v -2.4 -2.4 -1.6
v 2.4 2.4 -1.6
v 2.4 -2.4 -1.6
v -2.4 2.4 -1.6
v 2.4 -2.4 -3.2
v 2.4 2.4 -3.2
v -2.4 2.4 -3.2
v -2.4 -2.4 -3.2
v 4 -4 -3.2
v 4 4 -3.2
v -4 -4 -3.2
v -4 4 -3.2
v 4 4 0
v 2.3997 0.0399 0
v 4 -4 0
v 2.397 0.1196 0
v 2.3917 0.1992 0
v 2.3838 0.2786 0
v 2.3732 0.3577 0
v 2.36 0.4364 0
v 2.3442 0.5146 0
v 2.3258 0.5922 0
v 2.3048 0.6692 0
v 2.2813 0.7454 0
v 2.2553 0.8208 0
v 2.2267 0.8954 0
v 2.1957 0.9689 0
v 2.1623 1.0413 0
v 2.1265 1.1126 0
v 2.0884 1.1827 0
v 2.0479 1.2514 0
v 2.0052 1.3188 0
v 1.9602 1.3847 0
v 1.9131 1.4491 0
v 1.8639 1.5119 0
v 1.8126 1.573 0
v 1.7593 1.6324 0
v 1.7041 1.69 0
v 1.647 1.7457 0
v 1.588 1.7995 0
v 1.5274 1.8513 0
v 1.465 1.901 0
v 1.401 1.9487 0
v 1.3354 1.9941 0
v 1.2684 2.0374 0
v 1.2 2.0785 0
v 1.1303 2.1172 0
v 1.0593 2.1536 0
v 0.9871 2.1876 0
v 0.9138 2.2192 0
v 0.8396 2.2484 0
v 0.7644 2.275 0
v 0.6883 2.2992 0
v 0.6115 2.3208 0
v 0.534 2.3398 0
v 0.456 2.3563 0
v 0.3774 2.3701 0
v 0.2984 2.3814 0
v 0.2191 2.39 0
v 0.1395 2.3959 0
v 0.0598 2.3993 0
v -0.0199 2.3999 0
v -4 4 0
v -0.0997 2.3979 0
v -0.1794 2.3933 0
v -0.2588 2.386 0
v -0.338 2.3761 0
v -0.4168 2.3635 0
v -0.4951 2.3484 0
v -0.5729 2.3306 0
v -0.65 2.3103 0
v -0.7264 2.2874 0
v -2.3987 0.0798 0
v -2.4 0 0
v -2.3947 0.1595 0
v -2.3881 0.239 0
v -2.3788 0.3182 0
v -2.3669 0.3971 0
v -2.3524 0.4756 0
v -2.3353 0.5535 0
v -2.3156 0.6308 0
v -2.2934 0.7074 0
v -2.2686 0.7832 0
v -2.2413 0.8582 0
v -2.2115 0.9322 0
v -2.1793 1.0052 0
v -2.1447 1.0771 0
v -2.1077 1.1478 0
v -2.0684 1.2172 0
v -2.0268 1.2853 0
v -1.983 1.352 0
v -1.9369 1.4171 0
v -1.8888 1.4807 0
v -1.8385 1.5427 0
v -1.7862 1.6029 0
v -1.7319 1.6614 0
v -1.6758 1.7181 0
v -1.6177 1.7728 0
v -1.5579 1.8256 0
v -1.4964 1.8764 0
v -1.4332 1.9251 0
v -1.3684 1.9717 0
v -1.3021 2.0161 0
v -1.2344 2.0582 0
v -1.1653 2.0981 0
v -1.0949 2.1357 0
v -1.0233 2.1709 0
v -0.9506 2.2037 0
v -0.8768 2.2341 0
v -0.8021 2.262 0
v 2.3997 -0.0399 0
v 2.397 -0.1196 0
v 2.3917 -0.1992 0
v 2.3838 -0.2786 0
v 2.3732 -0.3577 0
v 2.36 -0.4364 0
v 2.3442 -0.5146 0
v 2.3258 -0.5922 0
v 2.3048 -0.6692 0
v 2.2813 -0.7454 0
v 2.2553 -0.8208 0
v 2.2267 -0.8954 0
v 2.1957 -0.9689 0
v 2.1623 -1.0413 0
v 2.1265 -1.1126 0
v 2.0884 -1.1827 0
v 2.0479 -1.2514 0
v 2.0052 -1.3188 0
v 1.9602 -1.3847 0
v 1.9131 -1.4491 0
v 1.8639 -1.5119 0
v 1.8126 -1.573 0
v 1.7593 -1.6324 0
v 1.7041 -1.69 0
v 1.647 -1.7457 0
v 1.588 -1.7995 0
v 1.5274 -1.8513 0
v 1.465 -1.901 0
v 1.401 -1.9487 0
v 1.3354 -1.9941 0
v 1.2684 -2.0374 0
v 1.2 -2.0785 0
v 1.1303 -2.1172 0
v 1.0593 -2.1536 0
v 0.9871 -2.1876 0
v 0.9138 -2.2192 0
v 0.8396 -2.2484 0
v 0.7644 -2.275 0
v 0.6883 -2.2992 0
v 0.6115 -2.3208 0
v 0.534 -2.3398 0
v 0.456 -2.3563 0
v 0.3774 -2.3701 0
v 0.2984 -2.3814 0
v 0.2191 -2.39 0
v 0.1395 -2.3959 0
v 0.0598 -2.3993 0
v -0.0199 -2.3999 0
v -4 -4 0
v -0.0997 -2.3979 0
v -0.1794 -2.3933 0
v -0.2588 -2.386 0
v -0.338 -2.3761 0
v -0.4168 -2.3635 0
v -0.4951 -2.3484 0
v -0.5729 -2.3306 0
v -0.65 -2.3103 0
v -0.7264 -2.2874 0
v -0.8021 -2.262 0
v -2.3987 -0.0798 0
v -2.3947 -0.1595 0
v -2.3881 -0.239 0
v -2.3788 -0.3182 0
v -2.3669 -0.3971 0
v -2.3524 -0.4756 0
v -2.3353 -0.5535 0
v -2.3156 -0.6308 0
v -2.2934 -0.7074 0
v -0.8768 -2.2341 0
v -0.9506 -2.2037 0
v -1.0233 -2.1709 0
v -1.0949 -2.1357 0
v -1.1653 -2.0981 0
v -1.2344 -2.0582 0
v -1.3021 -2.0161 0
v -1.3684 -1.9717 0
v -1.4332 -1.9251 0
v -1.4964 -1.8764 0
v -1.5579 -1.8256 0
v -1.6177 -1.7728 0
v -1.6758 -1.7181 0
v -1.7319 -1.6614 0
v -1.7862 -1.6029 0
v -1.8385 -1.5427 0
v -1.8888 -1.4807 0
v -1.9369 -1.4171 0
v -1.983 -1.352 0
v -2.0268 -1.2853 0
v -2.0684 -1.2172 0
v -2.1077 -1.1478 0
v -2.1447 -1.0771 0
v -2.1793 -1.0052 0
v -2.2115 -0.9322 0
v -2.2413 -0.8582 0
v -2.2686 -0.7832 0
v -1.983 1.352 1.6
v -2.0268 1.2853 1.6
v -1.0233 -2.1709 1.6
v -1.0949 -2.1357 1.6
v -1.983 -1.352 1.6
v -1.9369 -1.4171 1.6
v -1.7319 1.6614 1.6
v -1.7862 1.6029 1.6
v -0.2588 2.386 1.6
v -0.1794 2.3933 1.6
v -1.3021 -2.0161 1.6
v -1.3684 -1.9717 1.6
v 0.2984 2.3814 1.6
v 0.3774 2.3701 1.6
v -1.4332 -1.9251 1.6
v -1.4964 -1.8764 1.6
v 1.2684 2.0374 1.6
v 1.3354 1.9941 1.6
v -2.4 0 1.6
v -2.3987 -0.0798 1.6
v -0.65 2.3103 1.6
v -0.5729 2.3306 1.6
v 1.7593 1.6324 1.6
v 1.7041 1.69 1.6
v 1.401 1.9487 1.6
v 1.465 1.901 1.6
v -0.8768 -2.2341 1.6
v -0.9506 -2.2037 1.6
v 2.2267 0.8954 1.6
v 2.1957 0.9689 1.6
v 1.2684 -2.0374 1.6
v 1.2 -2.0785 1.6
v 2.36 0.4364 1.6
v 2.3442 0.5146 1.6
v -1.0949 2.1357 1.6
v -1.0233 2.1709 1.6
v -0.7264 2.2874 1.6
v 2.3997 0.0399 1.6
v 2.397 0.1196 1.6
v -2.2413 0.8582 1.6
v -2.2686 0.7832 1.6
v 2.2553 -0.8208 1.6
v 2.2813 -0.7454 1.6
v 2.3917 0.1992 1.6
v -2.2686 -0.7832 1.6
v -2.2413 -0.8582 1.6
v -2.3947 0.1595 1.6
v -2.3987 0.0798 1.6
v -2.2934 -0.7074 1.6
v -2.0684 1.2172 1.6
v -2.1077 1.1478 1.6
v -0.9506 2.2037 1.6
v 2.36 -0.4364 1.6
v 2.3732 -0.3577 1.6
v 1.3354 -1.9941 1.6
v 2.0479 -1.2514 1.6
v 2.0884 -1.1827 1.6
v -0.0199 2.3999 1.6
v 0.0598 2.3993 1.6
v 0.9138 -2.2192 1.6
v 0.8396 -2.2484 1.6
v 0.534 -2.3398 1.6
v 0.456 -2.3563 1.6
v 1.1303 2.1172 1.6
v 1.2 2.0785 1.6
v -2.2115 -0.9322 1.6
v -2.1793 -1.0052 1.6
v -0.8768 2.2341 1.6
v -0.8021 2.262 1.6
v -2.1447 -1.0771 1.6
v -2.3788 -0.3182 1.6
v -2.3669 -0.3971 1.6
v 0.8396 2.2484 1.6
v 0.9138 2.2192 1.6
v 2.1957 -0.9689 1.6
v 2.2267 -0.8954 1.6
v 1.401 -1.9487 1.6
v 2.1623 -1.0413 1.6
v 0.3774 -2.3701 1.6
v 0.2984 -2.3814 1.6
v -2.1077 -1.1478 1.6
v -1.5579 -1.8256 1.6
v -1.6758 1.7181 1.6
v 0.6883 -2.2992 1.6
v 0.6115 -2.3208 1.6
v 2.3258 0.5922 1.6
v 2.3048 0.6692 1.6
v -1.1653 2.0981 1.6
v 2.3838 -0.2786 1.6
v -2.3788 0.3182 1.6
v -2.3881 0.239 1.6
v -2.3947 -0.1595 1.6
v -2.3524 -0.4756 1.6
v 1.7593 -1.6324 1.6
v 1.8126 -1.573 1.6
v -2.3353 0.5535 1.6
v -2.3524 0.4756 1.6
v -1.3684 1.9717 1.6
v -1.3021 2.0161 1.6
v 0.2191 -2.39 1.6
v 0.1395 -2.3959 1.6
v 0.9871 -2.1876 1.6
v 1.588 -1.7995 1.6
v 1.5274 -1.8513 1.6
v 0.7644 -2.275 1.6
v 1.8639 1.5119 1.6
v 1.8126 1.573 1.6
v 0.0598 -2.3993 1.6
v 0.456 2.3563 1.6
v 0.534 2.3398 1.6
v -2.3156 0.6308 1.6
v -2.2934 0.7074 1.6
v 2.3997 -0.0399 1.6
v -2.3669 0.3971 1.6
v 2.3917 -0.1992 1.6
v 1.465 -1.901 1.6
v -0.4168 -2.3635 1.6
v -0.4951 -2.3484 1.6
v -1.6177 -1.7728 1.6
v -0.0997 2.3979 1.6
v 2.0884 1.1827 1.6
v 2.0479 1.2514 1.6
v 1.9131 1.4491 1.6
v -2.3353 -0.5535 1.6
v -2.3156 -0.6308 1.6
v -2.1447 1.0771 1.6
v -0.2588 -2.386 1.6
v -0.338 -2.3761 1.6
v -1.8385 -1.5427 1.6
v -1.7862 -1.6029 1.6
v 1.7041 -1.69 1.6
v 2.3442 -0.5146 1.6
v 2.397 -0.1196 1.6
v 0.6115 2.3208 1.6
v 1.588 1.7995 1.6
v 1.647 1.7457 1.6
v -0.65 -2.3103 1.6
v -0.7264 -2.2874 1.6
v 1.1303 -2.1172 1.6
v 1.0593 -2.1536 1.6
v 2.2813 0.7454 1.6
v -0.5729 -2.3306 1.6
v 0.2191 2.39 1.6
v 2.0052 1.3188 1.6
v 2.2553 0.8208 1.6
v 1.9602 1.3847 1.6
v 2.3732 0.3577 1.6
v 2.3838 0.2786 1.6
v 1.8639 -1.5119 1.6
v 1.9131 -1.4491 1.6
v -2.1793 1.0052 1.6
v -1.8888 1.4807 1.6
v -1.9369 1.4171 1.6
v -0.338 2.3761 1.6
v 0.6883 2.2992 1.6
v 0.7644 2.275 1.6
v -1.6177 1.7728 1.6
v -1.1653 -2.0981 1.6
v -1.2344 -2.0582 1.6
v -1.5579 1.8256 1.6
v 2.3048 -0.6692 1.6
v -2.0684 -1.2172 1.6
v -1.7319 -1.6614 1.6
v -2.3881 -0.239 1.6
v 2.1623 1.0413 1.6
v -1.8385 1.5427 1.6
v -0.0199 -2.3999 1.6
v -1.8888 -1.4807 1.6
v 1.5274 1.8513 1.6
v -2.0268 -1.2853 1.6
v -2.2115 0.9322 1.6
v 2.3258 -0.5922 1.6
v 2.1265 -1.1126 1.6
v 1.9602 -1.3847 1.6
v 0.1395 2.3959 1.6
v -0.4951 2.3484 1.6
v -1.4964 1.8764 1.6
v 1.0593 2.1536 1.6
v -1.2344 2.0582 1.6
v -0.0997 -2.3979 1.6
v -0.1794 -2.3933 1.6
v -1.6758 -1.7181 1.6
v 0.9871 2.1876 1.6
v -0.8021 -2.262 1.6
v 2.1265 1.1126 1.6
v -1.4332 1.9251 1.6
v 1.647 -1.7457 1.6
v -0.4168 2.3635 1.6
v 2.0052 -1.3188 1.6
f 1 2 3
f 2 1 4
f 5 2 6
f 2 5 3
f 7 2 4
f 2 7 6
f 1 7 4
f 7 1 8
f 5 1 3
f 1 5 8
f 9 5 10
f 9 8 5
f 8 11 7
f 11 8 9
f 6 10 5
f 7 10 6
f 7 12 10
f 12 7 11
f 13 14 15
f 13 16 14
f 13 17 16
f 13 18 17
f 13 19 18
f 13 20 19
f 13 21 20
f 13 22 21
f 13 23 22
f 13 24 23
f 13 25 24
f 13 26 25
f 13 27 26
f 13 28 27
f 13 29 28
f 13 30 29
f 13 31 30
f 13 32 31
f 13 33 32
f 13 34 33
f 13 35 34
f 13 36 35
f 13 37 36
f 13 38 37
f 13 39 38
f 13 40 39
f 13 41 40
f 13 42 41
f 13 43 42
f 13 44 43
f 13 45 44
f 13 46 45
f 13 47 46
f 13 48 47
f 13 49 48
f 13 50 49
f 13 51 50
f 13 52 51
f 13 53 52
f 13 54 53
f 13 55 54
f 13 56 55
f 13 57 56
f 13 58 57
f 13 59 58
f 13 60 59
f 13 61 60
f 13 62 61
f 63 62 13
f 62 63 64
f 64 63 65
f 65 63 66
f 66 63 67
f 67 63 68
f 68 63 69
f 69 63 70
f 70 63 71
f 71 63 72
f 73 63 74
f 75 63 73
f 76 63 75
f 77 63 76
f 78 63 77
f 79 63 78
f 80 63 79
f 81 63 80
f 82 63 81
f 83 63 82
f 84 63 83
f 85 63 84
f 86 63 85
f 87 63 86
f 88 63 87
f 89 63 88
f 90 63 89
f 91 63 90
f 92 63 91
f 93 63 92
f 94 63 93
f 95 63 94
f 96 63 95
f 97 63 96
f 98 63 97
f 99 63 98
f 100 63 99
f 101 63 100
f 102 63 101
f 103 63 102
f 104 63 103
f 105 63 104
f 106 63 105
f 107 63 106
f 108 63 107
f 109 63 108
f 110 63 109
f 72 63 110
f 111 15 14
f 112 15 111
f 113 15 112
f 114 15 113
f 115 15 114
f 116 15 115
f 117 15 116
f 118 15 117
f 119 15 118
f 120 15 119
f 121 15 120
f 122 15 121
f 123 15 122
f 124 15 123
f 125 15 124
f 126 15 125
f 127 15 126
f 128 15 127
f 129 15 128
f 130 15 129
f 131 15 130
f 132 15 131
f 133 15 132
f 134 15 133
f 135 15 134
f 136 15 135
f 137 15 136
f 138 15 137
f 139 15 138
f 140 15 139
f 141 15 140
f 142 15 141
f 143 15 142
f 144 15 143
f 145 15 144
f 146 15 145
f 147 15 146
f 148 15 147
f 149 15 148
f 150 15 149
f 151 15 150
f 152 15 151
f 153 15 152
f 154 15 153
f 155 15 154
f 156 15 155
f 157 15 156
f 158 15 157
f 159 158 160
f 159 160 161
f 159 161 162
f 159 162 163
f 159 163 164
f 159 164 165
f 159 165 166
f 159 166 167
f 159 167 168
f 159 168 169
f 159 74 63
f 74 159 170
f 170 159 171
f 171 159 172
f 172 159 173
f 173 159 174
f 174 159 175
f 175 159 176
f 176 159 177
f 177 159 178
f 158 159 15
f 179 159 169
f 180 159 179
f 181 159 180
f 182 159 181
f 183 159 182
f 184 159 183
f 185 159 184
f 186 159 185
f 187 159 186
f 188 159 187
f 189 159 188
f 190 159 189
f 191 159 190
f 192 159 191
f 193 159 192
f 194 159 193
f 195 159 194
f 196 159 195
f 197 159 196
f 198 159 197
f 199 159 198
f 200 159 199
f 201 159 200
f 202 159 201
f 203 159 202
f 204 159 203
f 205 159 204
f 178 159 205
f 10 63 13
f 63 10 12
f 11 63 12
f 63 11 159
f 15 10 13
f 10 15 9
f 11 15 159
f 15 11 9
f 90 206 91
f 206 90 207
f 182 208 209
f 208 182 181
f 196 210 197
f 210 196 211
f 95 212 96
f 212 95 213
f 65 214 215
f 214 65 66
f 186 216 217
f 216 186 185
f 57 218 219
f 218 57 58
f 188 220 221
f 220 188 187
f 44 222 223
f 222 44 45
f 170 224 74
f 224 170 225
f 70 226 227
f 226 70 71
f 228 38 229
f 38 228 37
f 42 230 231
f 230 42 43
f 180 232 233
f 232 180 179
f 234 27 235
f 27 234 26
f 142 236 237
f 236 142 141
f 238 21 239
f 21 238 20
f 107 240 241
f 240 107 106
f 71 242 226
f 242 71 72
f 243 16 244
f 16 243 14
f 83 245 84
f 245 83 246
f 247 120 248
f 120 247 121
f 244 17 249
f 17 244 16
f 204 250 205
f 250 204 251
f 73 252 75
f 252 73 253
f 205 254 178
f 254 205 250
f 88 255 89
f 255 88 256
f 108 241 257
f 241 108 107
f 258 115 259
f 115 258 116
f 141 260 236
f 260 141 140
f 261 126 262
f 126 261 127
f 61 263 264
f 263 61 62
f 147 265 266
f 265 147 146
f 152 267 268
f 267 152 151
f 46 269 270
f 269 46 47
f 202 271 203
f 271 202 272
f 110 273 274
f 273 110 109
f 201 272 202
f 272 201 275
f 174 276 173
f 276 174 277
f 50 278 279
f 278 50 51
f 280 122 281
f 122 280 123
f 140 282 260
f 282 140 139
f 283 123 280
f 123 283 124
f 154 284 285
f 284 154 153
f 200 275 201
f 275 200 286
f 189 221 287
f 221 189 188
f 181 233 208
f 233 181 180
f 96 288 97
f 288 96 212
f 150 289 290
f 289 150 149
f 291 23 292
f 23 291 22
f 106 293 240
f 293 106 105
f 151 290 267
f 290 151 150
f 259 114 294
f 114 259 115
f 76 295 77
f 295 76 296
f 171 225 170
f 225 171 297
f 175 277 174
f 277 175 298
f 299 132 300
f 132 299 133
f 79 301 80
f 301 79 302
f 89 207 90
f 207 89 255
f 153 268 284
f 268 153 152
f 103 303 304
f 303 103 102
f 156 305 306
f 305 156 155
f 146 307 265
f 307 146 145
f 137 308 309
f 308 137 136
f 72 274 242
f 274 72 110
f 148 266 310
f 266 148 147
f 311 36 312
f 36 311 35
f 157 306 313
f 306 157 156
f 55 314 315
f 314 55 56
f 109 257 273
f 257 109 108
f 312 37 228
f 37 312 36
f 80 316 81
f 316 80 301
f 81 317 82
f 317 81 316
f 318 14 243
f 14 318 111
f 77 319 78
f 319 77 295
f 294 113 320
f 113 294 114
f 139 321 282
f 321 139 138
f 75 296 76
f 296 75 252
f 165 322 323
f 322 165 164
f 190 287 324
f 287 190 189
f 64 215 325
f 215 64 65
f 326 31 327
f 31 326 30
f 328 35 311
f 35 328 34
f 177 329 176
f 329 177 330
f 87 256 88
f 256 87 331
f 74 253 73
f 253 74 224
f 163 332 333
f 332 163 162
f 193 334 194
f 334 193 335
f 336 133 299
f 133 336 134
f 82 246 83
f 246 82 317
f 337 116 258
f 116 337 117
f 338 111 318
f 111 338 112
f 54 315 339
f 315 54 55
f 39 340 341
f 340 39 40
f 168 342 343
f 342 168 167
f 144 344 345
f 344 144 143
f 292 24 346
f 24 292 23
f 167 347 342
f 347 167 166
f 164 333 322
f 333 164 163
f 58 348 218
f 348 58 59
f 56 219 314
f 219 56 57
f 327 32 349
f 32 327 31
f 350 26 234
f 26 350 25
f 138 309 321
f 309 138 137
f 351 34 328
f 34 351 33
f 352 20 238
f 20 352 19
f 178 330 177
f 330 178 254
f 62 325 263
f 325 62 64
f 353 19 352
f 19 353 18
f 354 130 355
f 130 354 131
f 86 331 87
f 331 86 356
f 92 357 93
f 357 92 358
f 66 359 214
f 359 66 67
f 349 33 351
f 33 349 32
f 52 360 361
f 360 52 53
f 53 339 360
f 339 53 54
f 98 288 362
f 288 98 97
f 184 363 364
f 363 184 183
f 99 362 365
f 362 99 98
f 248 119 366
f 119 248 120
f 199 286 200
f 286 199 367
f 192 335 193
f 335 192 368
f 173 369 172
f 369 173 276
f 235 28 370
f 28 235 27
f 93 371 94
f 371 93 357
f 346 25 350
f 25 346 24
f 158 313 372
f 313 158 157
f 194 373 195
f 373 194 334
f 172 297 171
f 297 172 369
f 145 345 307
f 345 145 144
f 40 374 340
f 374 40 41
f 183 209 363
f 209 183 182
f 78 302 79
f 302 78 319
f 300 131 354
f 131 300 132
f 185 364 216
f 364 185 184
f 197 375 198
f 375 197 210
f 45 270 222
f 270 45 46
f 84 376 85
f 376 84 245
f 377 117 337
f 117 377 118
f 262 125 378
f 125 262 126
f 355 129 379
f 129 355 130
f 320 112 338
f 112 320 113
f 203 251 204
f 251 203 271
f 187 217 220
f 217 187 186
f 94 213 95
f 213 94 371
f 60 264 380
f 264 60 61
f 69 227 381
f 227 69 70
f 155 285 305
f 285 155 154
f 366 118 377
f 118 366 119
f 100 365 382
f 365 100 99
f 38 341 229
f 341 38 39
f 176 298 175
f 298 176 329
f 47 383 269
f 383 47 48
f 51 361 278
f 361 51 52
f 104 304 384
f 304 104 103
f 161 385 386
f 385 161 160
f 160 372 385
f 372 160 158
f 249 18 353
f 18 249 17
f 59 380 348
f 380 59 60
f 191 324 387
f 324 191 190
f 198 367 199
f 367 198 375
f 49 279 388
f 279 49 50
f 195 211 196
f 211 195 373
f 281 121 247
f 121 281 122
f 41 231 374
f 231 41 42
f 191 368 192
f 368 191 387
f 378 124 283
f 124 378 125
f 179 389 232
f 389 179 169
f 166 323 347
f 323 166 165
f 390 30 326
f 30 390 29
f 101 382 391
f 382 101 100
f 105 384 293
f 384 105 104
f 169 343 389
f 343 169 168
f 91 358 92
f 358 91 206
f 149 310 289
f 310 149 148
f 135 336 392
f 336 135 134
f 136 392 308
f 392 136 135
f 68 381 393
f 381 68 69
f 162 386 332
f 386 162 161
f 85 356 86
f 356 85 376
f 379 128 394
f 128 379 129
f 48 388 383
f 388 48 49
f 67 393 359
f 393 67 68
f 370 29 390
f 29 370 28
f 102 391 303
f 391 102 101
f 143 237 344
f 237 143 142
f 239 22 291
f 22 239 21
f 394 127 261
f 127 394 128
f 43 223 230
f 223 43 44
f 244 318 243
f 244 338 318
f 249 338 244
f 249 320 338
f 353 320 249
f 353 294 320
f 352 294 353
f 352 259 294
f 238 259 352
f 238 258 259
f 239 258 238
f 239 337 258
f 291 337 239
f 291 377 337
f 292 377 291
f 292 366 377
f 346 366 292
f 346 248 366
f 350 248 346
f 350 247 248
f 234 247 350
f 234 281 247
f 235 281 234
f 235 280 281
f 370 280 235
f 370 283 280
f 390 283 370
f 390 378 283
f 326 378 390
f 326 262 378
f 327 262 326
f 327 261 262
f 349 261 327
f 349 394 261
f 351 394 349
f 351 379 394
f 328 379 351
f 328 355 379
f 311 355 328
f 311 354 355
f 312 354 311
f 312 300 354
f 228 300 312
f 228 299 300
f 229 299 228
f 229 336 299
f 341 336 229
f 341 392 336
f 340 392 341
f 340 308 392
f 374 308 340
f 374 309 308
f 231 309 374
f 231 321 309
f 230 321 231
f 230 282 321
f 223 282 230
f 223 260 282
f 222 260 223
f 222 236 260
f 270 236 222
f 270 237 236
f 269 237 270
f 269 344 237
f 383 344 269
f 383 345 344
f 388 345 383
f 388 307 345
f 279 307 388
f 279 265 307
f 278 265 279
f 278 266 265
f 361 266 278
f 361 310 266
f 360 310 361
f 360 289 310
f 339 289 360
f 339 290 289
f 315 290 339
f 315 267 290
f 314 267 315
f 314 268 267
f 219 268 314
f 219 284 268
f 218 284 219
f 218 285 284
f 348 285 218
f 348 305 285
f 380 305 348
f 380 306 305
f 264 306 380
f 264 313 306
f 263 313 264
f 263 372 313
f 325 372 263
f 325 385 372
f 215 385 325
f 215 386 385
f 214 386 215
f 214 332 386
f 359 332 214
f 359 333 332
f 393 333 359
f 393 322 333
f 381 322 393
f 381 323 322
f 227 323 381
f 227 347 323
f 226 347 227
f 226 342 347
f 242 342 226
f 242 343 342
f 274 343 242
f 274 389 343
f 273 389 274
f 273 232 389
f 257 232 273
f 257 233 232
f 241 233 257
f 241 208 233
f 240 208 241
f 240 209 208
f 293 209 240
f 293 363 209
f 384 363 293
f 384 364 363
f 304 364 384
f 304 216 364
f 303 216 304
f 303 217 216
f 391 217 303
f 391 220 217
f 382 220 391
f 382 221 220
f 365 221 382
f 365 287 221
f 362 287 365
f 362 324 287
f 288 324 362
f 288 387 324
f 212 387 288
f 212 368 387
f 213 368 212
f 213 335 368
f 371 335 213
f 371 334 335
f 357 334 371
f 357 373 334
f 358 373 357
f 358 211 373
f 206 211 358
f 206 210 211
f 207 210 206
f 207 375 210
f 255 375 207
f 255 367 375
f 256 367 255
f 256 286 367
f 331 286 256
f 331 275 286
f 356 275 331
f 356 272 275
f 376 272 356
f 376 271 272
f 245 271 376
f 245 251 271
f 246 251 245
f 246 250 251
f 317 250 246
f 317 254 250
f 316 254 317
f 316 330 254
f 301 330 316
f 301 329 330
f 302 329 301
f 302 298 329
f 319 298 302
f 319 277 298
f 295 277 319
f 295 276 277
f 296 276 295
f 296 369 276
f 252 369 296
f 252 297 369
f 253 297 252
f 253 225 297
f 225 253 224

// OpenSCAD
// file: ../p/stud3.scad
use <../lib.scad>
use <4-4cyli.scad>
use <4-4disc.scad>
use <4-4edge.scad>
$fa=1; $fs=0.2;
function ldraw_lib__stud3(realsolid=false) = realsolid ? 
    [openscad(translate([0,0,-eps()], o=cylinder(4+eps(), r=4)),2)] : [
// 0 Stud Tube Solid
// 0 Name: stud3.dat
// 0 Author: James Jessiman
// 0 !LDRAW_ORG Primitive UPDATE 2012-01
// 0 !LICENSE Licensed under CC BY 2.0 and CC BY 4.0 : see CAreadme.txt
// 
// 0 BFC CERTIFY CCW
  [0,"BFC","CERTIFY"],
  [0,"BFC","CCW"],
// 
// 0 !HISTORY 2002-04-04 [sbliss] Modified for BFC compliance
// 0 !HISTORY 2002-04-25 [PTadmin] Official Update 2002-02
// 0 !HISTORY 2007-06-24 [PTadmin] Header formatted for Contributor Agreement
// 0 !HISTORY 2008-07-01 [PTadmin] Official Update 2008-01
// 0 !HISTORY 2012-02-16 [Philo] Changed to CCW
// 0 !HISTORY 2012-03-30 [PTadmin] Official Update 2012-01
// 
// 
// 1 16 0 -4 0 4 0 0 0 1 0 0 0 4 4-4edge.dat
  [1,16,0,-4,0,4,0,0,0,1,0,0,0,4, ldraw_lib__4_4edge(realsolid)],
// 1 16 0 0 0 4 0 0 0 1 0 0 0 4 4-4edge.dat
  [1,16,0,0,0,4,0,0,0,1,0,0,0,4, ldraw_lib__4_4edge(realsolid)],
// 1 16 0 -4 0 4 0 0 0 1 0 0 0 4 4-4disc.dat
  [1,16,0,-4,0,4,0,0,0,1,0,0,0,4, ldraw_lib__4_4disc(realsolid)],
// 1 16 0 -4 0 4 0 0 0 4 0 0 0 4 4-4cyli.dat
  [1,16,0,-4,0,4,0,0,0,4,0,0,0,4, ldraw_lib__4_4cyli(realsolid)],
];
module ldraw_lib__stud3(step=0, col=false, unit=2/5, alt=false, line=0.2, solid=!$preview)
    makepoly(ldraw_lib__stud3(solid), step=step, col=col, unit=unit, alt=alt, line=line, solid=solid);
ldraw_lib__stud3(line=0.2);
// file: ../p/4-4edge.scad
use <../lib.scad>
$fa=1; $fs=0.2;
function ldraw_lib__4_4edge(realsolid=false) = [
// 0 Circle 1.0
// 0 Name: 4-4edge.dat
// 0 Author: James Jessiman
// 0 !LDRAW_ORG Primitive UPDATE 2017-01
// 0 !LICENSE Licensed under CC BY 2.0 and CC BY 4.0 : see CAreadme.txt
// 
// 0 BFC CERTIFY CCW
  [0,"BFC","CERTIFY"],
  [0,"BFC","CCW"],
// 
// 0 !HISTORY 1998-12-15 [PTadmin] Official Update 1998-10
// 0 !HISTORY 2005-12-28 [PTadmin] Official Update 2005-01
// 0 !HISTORY 2007-06-24 [PTadmin] Header formatted for Contributor Agreement
// 0 !HISTORY 2008-07-01 [PTadmin] Official Update 2008-01
// 0 !HISTORY 2017-01-15 [Steffen] BFCed
// 0 !HISTORY 2017-12-30 [PTadmin] Official Update 2017-01
// 
// 
// 2 24 1 0 0 0.9239 0 0.3827
  [2,24,1,0,0,0.9239,0,0.3827],
// 2 24 0.9239 0 0.3827 0.7071 0 0.7071
  [2,24,0.9239,0,0.3827,0.7071,0,0.7071],
// 2 24 0.7071 0 0.7071 0.3827 0 0.9239
  [2,24,0.7071,0,0.7071,0.3827,0,0.9239],
// 2 24 0.3827 0 0.9239 0 0 1
  [2,24,0.3827,0,0.9239,0,0,1],
// 2 24 0 0 1 -0.3827 0 0.9239
  [2,24,0,0,1,-0.3827,0,0.9239],
// 2 24 -0.3827 0 0.9239 -0.7071 0 0.7071
  [2,24,-0.3827,0,0.9239,-0.7071,0,0.7071],
// 2 24 -0.7071 0 0.7071 -0.9239 0 0.3827
  [2,24,-0.7071,0,0.7071,-0.9239,0,0.3827],
// 2 24 -0.9239 0 0.3827 -1 0 -0
  [2,24,-0.9239,0,0.3827,-1,0,-0],
// 2 24 -1 0 -0 -0.9239 0 -0.3827
  [2,24,-1,0,-0,-0.9239,0,-0.3827],
// 2 24 -0.9239 0 -0.3827 -0.7071 0 -0.7071
  [2,24,-0.9239,0,-0.3827,-0.7071,0,-0.7071],
// 2 24 -0.7071 0 -0.7071 -0.3827 0 -0.9239
  [2,24,-0.7071,0,-0.7071,-0.3827,0,-0.9239],
// 2 24 -0.3827 0 -0.9239 0 0 -1
  [2,24,-0.3827,0,-0.9239,0,0,-1],
// 2 24 0 0 -1 0.3827 0 -0.9239
  [2,24,0,0,-1,0.3827,0,-0.9239],
// 2 24 0.3827 0 -0.9239 0.7071 0 -0.7071
  [2,24,0.3827,0,-0.9239,0.7071,0,-0.7071],
// 2 24 0.7071 0 -0.7071 0.9239 0 -0.3827
  [2,24,0.7071,0,-0.7071,0.9239,0,-0.3827],
// 2 24 0.9239 0 -0.3827 1 0 0
  [2,24,0.9239,0,-0.3827,1,0,0],
];
module ldraw_lib__4_4edge(step=0, col=false, unit=2/5, alt=false, line=0.2, solid=!$preview)
    makepoly(ldraw_lib__4_4edge(solid), step=step, col=col, unit=unit, alt=alt, line=line, solid=solid);
ldraw_lib__4_4edge(line=0.2);
// file: ../p/4-4disc.scad
use <../lib.scad>
$fa=1; $fs=0.2;
function ldraw_lib__4_4disc(realsolid=false) = [
// 0 Disc 1.0
// 0 Name: 4-4disc.dat
// 0 Author: James Jessiman
// 0 !LDRAW_ORG Primitive UPDATE 2002-02
// 0 !LICENSE Licensed under CC BY 2.0 and CC BY 4.0 : see CAreadme.txt
// 
// 0 BFC CERTIFY CCW
  [0,"BFC","CERTIFY"],
  [0,"BFC","CCW"],
// 
// 0 !HISTORY 1998-12-15 [PTadmin] Official Update 1998-10
// 0 !HISTORY 2002-03-23 [sbliss] Added BFC statement
// 0 !HISTORY 2002-04-25 [PTadmin] Official Update 2002-02
// 0 !HISTORY 2007-06-24 [PTadmin] Header formatted for Contributor Agreement
// 0 !HISTORY 2008-07-01 [PTadmin] Official Update 2008-01
// 
// 
// 3 16 0 0 0 1 0 0 0.9239 0 0.3827
  [3,16,0,0,0,1,0,0,0.9239,0,0.3827],
// 3 16 0 0 0 0.9239 0 0.3827 0.7071 0 0.7071
  [3,16,0,0,0,0.9239,0,0.3827,0.7071,0,0.7071],
// 3 16 0 0 0 0.7071 0 0.7071 0.3827 0 0.9239
  [3,16,0,0,0,0.7071,0,0.7071,0.3827,0,0.9239],
// 3 16 0 0 0 0.3827 0 0.9239 0 0 1
  [3,16,0,0,0,0.3827,0,0.9239,0,0,1],
// 3 16 0 0 0 0 0 1 -0.3827 0 0.9239
  [3,16,0,0,0,0,0,1,-0.3827,0,0.9239],
// 3 16 0 0 0 -0.3827 0 0.9239 -0.7071 0 0.7071
  [3,16,0,0,0,-0.3827,0,0.9239,-0.7071,0,0.7071],
// 3 16 0 0 0 -0.7071 0 0.7071 -0.9239 0 0.3827
  [3,16,0,0,0,-0.7071,0,0.7071,-0.9239,0,0.3827],
// 3 16 0 0 0 -0.9239 0 0.3827 -1 0 -0
  [3,16,0,0,0,-0.9239,0,0.3827,-1,0,-0],
// 3 16 0 0 0 -1 0 -0 -0.9239 0 -0.3827
  [3,16,0,0,0,-1,0,-0,-0.9239,0,-0.3827],
// 3 16 0 0 0 -0.9239 0 -0.3827 -0.7071 0 -0.7071
  [3,16,0,0,0,-0.9239,0,-0.3827,-0.7071,0,-0.7071],
// 3 16 0 0 0 -0.7071 0 -0.7071 -0.3827 0 -0.9239
  [3,16,0,0,0,-0.7071,0,-0.7071,-0.3827,0,-0.9239],
// 3 16 0 0 0 -0.3827 0 -0.9239 0 0 -1
  [3,16,0,0,0,-0.3827,0,-0.9239,0,0,-1],
// 3 16 0 0 0 0 0 -1 0.3827 0 -0.9239
  [3,16,0,0,0,0,0,-1,0.3827,0,-0.9239],
// 3 16 0 0 0 0.3827 0 -0.9239 0.7071 0 -0.7071
  [3,16,0,0,0,0.3827,0,-0.9239,0.7071,0,-0.7071],
// 3 16 0 0 0 0.7071 0 -0.7071 0.9239 0 -0.3827
  [3,16,0,0,0,0.7071,0,-0.7071,0.9239,0,-0.3827],
// 3 16 0 0 0 0.9239 0 -0.3827 1 0 0
  [3,16,0,0,0,0.9239,0,-0.3827,1,0,0],
// 0
];
module ldraw_lib__4_4disc(step=0, col=false, unit=2/5, alt=false, line=0.2, solid=!$preview)
    makepoly(ldraw_lib__4_4disc(solid), step=step, col=col, unit=unit, alt=alt, line=line, solid=solid);
ldraw_lib__4_4disc(line=0.2);
// file: ../p/4-4cyli.scad
use <../lib.scad>
$fa=1; $fs=0.2;
function ldraw_lib__4_4cyli(realsolid=false) = [
// 0 Cylinder 1.0
// 0 Name: 4-4cyli.dat
// 0 Author: James Jessiman
// 0 !LDRAW_ORG Primitive UPDATE 2005-01
// 0 !LICENSE Licensed under CC BY 2.0 and CC BY 4.0 : see CAreadme.txt
// 
// 0 BFC CERTIFY CCW
  [0,"BFC","CERTIFY"],
  [0,"BFC","CCW"],
// 
// 0 !HISTORY 1998-12-15 [PTadmin] Official Update 1998-10
// 0 !HISTORY 2002-03-23 [sbliss] Added BFC statement; merged headers from files in distributions LDraw 0.27 and Complete.
// 0 !HISTORY 2002-04-25 [PTadmin] Official Update 2002-02
// 0 !HISTORY 2004-12-14 [guyvivan] BFC CCW
// 0 !HISTORY 2005-12-28 [PTadmin] Official Update 2005-01
// 0 !HISTORY 2007-06-24 [PTadmin] Header formatted for Contributor Agreement
// 0 !HISTORY 2008-07-01 [PTadmin] Official Update 2008-01
// 
// 
// 4 16 1 1 0 0.9239 1 0.3827 0.9239 0 0.3827 1 0 0
  [4,16,1,1,0,0.9239,1,0.3827,0.9239,0,0.3827,1,0,0],
// 5 24 1 0 0 1 1 0 0.9239 0 0.3827 0.9239 0 -0.3827
  [5,24,1,0,0,1,1,0,0.9239,0,0.3827,0.9239,0,-0.3827],
// 4 16 0.9239 1 0.3827 0.7071 1 0.7071 0.7071 0 0.7071 0.9239 0 0.3827
  [4,16,0.9239,1,0.3827,0.7071,1,0.7071,0.7071,0,0.7071,0.9239,0,0.3827],
// 5 24 0.9239 0 0.3827 0.9239 1 0.3827 0.7071 0 0.7071 1 0 0
  [5,24,0.9239,0,0.3827,0.9239,1,0.3827,0.7071,0,0.7071,1,0,0],
// 4 16 0.7071 1 0.7071 0.3827 1 0.9239 0.3827 0 0.9239 0.7071 0 0.7071
  [4,16,0.7071,1,0.7071,0.3827,1,0.9239,0.3827,0,0.9239,0.7071,0,0.7071],
// 5 24 0.7071 0 0.7071 0.7071 1 0.7071 0.3827 0 0.9239 0.9239 0 0.3827
  [5,24,0.7071,0,0.7071,0.7071,1,0.7071,0.3827,0,0.9239,0.9239,0,0.3827],
// 4 16 0.3827 1 0.9239 0 1 1 0 0 1 0.3827 0 0.9239
  [4,16,0.3827,1,0.9239,0,1,1,0,0,1,0.3827,0,0.9239],
// 5 24 0.3827 0 0.9239 0.3827 1 0.9239 0 0 1 0.7071 0 0.7071
  [5,24,0.3827,0,0.9239,0.3827,1,0.9239,0,0,1,0.7071,0,0.7071],
// 4 16 0 1 1 -0.3827 1 0.9239 -0.3827 0 0.9239 0 0 1
  [4,16,0,1,1,-0.3827,1,0.9239,-0.3827,0,0.9239,0,0,1],
// 5 24 0 0 1 0 1 1 -0.3827 0 0.9239 0.3827 0 0.9239
  [5,24,0,0,1,0,1,1,-0.3827,0,0.9239,0.3827,0,0.9239],
// 4 16 -0.3827 1 0.9239 -0.7071 1 0.7071 -0.7071 0 0.7071 -0.3827 0 0.9239
  [4,16,-0.3827,1,0.9239,-0.7071,1,0.7071,-0.7071,0,0.7071,-0.3827,0,0.9239],
// 5 24 -0.3827 0 0.9239 -0.3827 1 0.9239 -0.7071 0 0.7071 0 0 1
  [5,24,-0.3827,0,0.9239,-0.3827,1,0.9239,-0.7071,0,0.7071,0,0,1],
// 4 16 -0.7071 1 0.7071 -0.9239 1 0.3827 -0.9239 0 0.3827 -0.7071 0 0.7071
  [4,16,-0.7071,1,0.7071,-0.9239,1,0.3827,-0.9239,0,0.3827,-0.7071,0,0.7071],
// 5 24 -0.7071 0 0.7071 -0.7071 1 0.7071 -0.9239 0 0.3827 -0.3827 0 0.9239
  [5,24,-0.7071,0,0.7071,-0.7071,1,0.7071,-0.9239,0,0.3827,-0.3827,0,0.9239],
// 4 16 -0.9239 1 0.3827 -1 1 0 -1 0 0 -0.9239 0 0.3827
  [4,16,-0.9239,1,0.3827,-1,1,0,-1,0,0,-0.9239,0,0.3827],
// 5 24 -0.9239 0 0.3827 -0.9239 1 0.3827 -1 0 0 -0.7071 0 0.7071
  [5,24,-0.9239,0,0.3827,-0.9239,1,0.3827,-1,0,0,-0.7071,0,0.7071],
// 4 16 -1 1 0 -0.9239 1 -0.3827 -0.9239 0 -0.3827 -1 0 0
  [4,16,-1,1,0,-0.9239,1,-0.3827,-0.9239,0,-0.3827,-1,0,0],
// 5 24 -1 0 0 -1 1 0 -0.9239 0 -0.3827 -0.9239 0 0.3827
  [5,24,-1,0,0,-1,1,0,-0.9239,0,-0.3827,-0.9239,0,0.3827],
// 4 16 -0.9239 1 -0.3827 -0.7071 1 -0.7071 -0.7071 0 -0.7071 -0.9239 0 -0.3827
  [4,16,-0.9239,1,-0.3827,-0.7071,1,-0.7071,-0.7071,0,-0.7071,-0.9239,0,-0.3827],
// 5 24 -0.9239 0 -0.3827 -0.9239 1 -0.3827 -0.7071 0 -0.7071 -1 0 0
  [5,24,-0.9239,0,-0.3827,-0.9239,1,-0.3827,-0.7071,0,-0.7071,-1,0,0],
// 4 16 -0.7071 1 -0.7071 -0.3827 1 -0.9239 -0.3827 0 -0.9239 -0.7071 0 -0.7071
  [4,16,-0.7071,1,-0.7071,-0.3827,1,-0.9239,-0.3827,0,-0.9239,-0.7071,0,-0.7071],
// 5 24 -0.7071 0 -0.7071 -0.7071 1 -0.7071 -0.3827 0 -0.9239 -0.9239 0 -0.3827
  [5,24,-0.7071,0,-0.7071,-0.7071,1,-0.7071,-0.3827,0,-0.9239,-0.9239,0,-0.3827],
// 4 16 -0.3827 1 -0.9239 0 1 -1 0 0 -1 -0.3827 0 -0.9239
  [4,16,-0.3827,1,-0.9239,0,1,-1,0,0,-1,-0.3827,0,-0.9239],
// 5 24 -0.3827 0 -0.9239 -0.3827 1 -0.9239 0 0 -1 -0.7071 0 -0.7071
  [5,24,-0.3827,0,-0.9239,-0.3827,1,-0.9239,0,0,-1,-0.7071,0,-0.7071],
// 4 16 0 1 -1 0.3827 1 -0.9239 0.3827 0 -0.9239 0 0 -1
  [4,16,0,1,-1,0.3827,1,-0.9239,0.3827,0,-0.9239,0,0,-1],
// 5 24 0 0 -1 0 1 -1 0.3827 0 -0.9239 -0.3827 0 -0.9239
  [5,24,0,0,-1,0,1,-1,0.3827,0,-0.9239,-0.3827,0,-0.9239],
// 4 16 0.3827 1 -0.9239 0.7071 1 -0.7071 0.7071 0 -0.7071 0.3827 0 -0.9239
  [4,16,0.3827,1,-0.9239,0.7071,1,-0.7071,0.7071,0,-0.7071,0.3827,0,-0.9239],
// 5 24 0.3827 0 -0.9239 0.3827 1 -0.9239 0.7071 0 -0.7071 0 0 -1
  [5,24,0.3827,0,-0.9239,0.3827,1,-0.9239,0.7071,0,-0.7071,0,0,-1],
// 4 16 0.7071 1 -0.7071 0.9239 1 -0.3827 0.9239 0 -0.3827 0.7071 0 -0.7071
  [4,16,0.7071,1,-0.7071,0.9239,1,-0.3827,0.9239,0,-0.3827,0.7071,0,-0.7071],
// 5 24 0.7071 0 -0.7071 0.7071 1 -0.7071 0.9239 0 -0.3827 0.3827 0 -0.9239
  [5,24,0.7071,0,-0.7071,0.7071,1,-0.7071,0.9239,0,-0.3827,0.3827,0,-0.9239],
// 4 16 0.9239 1 -0.3827 1 1 0 1 0 0 0.9239 0 -0.3827
  [4,16,0.9239,1,-0.3827,1,1,0,1,0,0,0.9239,0,-0.3827],
// 5 24 0.9239 0 -0.3827 0.9239 1 -0.3827 1 0 0 0.7071 0 -0.7071
  [5,24,0.9239,0,-0.3827,0.9239,1,-0.3827,1,0,0,0.7071,0,-0.7071],
// 0
];
module ldraw_lib__4_4cyli(step=0, col=false, unit=2/5, alt=false, line=0.2, solid=!$preview)
    makepoly(ldraw_lib__4_4cyli(solid), step=step, col=col, unit=unit, alt=alt, line=line, solid=solid);
ldraw_lib__4_4cyli(line=0.2);
// file: s/3004s01.scad
use <../../lib.scad>
use <../../p/box4t.scad>
use <../../p/box5.scad>
use <../../p/stud.scad>
use <../../p/stud3.scad>
$fa=1; $fs=0.2;
function ldraw_lib__s__3004s01(realsolid=false) = [
// 0 ~Brick  1 x  2 without Front Face
// 0 Name: s\3004s01.dat
// 0 Author: James Jessiman
// 0 !LDRAW_ORG Subpart UPDATE 2003-03
// 0 !LICENSE Licensed under CC BY 2.0 and CC BY 4.0 : see CAreadme.txt
// 
// 0 BFC CERTIFY CCW
  [0,"BFC","CERTIFY"],
  [0,"BFC","CCW"],
// 
// 0 !HISTORY 2003-09-07 [jriley] Subfiling, BFC
// 0 !HISTORY 2003-12-19 [PTadmin] Official Update 2003-03
// 0 !HISTORY 2007-08-29 [PTadmin] Header formatted for Contributor Agreement
// 0 !HISTORY 2008-07-01 [PTadmin] Official Update 2008-01
// 
// 
// 1 16 0 4 0 1 0 0 0 -5 0 0 0 1 stud3.dat
  [1,16,0,4,0,1,0,0,0,-5,0,0,0,1, ldraw_lib__stud3(realsolid)],
// 0 BFC INVERTNEXT
  [0,"BFC","INVERTNEXT"],
// 1 16 0 24 0 16 0 0 0 -20 0 0 0 6 box5.dat
  [1,16,0,24,0,16,0,0,0,-20,0,0,0,6, ldraw_lib__box5(realsolid)],
// 4 16 20 24 10 16 24 6 -16 24 6 -20 24 10
  [4,16,20,24,10,16,24,6,-16,24,6,-20,24,10],
// 4 16 -20 24 10 -16 24 6 -16 24 -6 -20 24 -10
  [4,16,-20,24,10,-16,24,6,-16,24,-6,-20,24,-10],
// 4 16 -20 24 -10 -16 24 -6 16 24 -6 20 24 -10
  [4,16,-20,24,-10,-16,24,-6,16,24,-6,20,24,-10],
// 4 16 20 24 -10 16 24 -6 16 24 6 20 24 10
  [4,16,20,24,-10,16,24,-6,16,24,6,20,24,10],
// 1 16 0 24 0 20 0 0 0 -24 0 0 0 10 box4t.dat
  [1,16,0,24,0,20,0,0,0,-24,0,0,0,10, ldraw_lib__box4t(realsolid)],
// 1 16 10 0 0 1 0 0 0 1 0 0 0 1 stud.dat
  [1,16,10,0,0,1,0,0,0,1,0,0,0,1, ldraw_lib__stud(realsolid)],
// 1 16 -10 0 0 1 0 0 0 1 0 0 0 1 stud.dat
  [1,16,-10,0,0,1,0,0,0,1,0,0,0,1, ldraw_lib__stud(realsolid)],
// 0
];
module ldraw_lib__s__3004s01(step=0, col=false, unit=2/5, alt=false, line=0.2, solid=!$preview)
    makepoly(ldraw_lib__s__3004s01(solid), step=step, col=col, unit=unit, alt=alt, line=line, solid=solid);
ldraw_lib__s__3004s01(line=0.2);
// file: ../p/stud.scad
use <../lib.scad>
use <4-4cyli.scad>
use <4-4disc.scad>
use <4-4edge.scad>
$fa=1; $fs=0.2;
function ldraw_lib__stud(realsolid=false) = realsolid ? 
    [openscad(translate([0,0,-eps()], o=cylinder(4+eps(), r=6)),2)] : [
// 0 Stud
// 0 Name: stud.dat
// 0 Author: James Jessiman
// 0 !LDRAW_ORG Primitive UPDATE 2012-01
// 0 !LICENSE Licensed under CC BY 2.0 and CC BY 4.0 : see CAreadme.txt
// 
// 0 BFC CERTIFY CCW
  [0,"BFC","CERTIFY"],
  [0,"BFC","CCW"],
// 
// 0 !HISTORY 2002-04-04 [sbliss] Modified for BFC compliance
// 0 !HISTORY 2002-04-25 [PTadmin] Official Update 2002-02
// 0 !HISTORY 2007-06-24 [PTadmin] Header formatted for Contributor Agreement
// 0 !HISTORY 2008-07-01 [PTadmin] Official Update 2008-01
// 0 !HISTORY 2012-02-16 [Philo] Changed to CCW
// 0 !HISTORY 2012-03-30 [PTadmin] Official Update 2012-01
// 
// 
// 1 16 0 0 0 6 0 0 0 1 0 0 0 6 4-4edge.dat
  [1,16,0,0,0,6,0,0,0,1,0,0,0,6, ldraw_lib__4_4edge(realsolid)],
// 1 16 0 -4 0 6 0 0 0 1 0 0 0 6 4-4edge.dat
  [1,16,0,-4,0,6,0,0,0,1,0,0,0,6, ldraw_lib__4_4edge(realsolid)],
// 1 16 0 0 0 6 0 0 0 -4 0 0 0 6 4-4cyli.dat
  [1,16,0,0,0,6,0,0,0,-4,0,0,0,6, ldraw_lib__4_4cyli(realsolid)],
// 1 16 0 -4 0 6 0 0 0 1 0 0 0 6 4-4disc.dat
  [1,16,0,-4,0,6,0,0,0,1,0,0,0,6, ldraw_lib__4_4disc(realsolid)],
];
module ldraw_lib__stud(step=0, col=false, unit=2/5, alt=false, line=0.2, solid=!$preview)
    makepoly(ldraw_lib__stud(solid), step=step, col=col, unit=unit, alt=alt, line=line, solid=solid);
ldraw_lib__stud(line=0.2);
// file: ../p/box5.scad
use <../lib.scad>
$fa=1; $fs=0.2;
function ldraw_lib__box5(realsolid=false) = [
// 0 Box with 5 Faces and All Edges
// 0 Name: box5.dat
// 0 Author: James Jessiman
// 0 !LDRAW_ORG Primitive UPDATE 2012-01
// 0 !LICENSE Licensed under CC BY 2.0 and CC BY 4.0 : see CAreadme.txt
// 
// 0 BFC CERTIFY CCW
  [0,"BFC","CERTIFY"],
  [0,"BFC","CCW"],
// 
// 0 !HISTORY 2002-04-03 [sbliss] Modified for BFC compliance
// 0 !HISTORY 2002-04-25 [PTadmin] Official Update 2002-02
// 0 !HISTORY 2007-06-24 [PTadmin] Header formatted for Contributor Agreement
// 0 !HISTORY 2008-07-01 [PTadmin] Official Update 2008-01
// 0 !HISTORY 2012-02-16 [Philo] Changed to CCW
// 0 !HISTORY 2012-03-30 [PTadmin] Official Update 2012-01
// 
// 
// 2 24 1 1 1 -1 1 1
  [2,24,1,1,1,-1,1,1],
// 2 24 -1 1 1 -1 1 -1
  [2,24,-1,1,1,-1,1,-1],
// 2 24 -1 1 -1 1 1 -1
  [2,24,-1,1,-1,1,1,-1],
// 2 24 1 1 -1 1 1 1
  [2,24,1,1,-1,1,1,1],
// 2 24 1 0 1 -1 0 1
  [2,24,1,0,1,-1,0,1],
// 2 24 -1 0 1 -1 0 -1
  [2,24,-1,0,1,-1,0,-1],
// 2 24 -1 0 -1 1 0 -1
  [2,24,-1,0,-1,1,0,-1],
// 2 24 1 0 -1 1 0 1
  [2,24,1,0,-1,1,0,1],
// 2 24 1 0 1 1 1 1
  [2,24,1,0,1,1,1,1],
// 2 24 -1 0 1 -1 1 1
  [2,24,-1,0,1,-1,1,1],
// 2 24 1 0 -1 1 1 -1
  [2,24,1,0,-1,1,1,-1],
// 2 24 -1 0 -1 -1 1 -1
  [2,24,-1,0,-1,-1,1,-1],
// 4 16 -1 1 1 1 1 1 1 1 -1 -1 1 -1
  [4,16,-1,1,1,1,1,1,1,1,-1,-1,1,-1],
// 4 16 -1 1 1 -1 0 1 1 0 1 1 1 1
  [4,16,-1,1,1,-1,0,1,1,0,1,1,1,1],
// 4 16 -1 1 -1 -1 0 -1 -1 0 1 -1 1 1
  [4,16,-1,1,-1,-1,0,-1,-1,0,1,-1,1,1],
// 4 16 1 1 -1 1 0 -1 -1 0 -1 -1 1 -1
  [4,16,1,1,-1,1,0,-1,-1,0,-1,-1,1,-1],
// 4 16 1 1 1 1 0 1 1 0 -1 1 1 -1
  [4,16,1,1,1,1,0,1,1,0,-1,1,1,-1],
];
module ldraw_lib__box5(step=0, col=false, unit=2/5, alt=false, line=0.2, solid=!$preview)
    makepoly(ldraw_lib__box5(solid), step=step, col=col, unit=unit, alt=alt, line=line, solid=solid);
ldraw_lib__box5(line=0.2);
// file: ../p/box4t.scad
use <../lib.scad>
$fa=1; $fs=0.2;
function ldraw_lib__box4t(realsolid=false) = [
// 0 Box with 4 Adjacent Faces and All Edges
// 0 Name: box4t.dat
// 0 Author: Tore Eriksson [Tore_Eriksson]
// 0 !LDRAW_ORG Primitive UPDATE 2003-02
// 0 !LICENSE Licensed under CC BY 2.0 and CC BY 4.0 : see CAreadme.txt
// 
// 0 BFC CERTIFY CCW
  [0,"BFC","CERTIFY"],
  [0,"BFC","CCW"],
// 
// 0 !HISTORY 1997-09-29 [PTadmin] Official Update 1997-15
// 0 !HISTORY 2002-08-31 [izanette] Modified with WINDZ for BFC compliance
// 0 !HISTORY 2003-08-01 [PTadmin] Official Update 2003-02
// 0 !HISTORY 2007-06-24 [PTadmin] Header formatted for Contributor Agreement
// 0 !HISTORY 2008-07-01 [PTadmin] Official Update 2008-01
// 
// 
// 2 24 1 1 1 -1 1 1
  [2,24,1,1,1,-1,1,1],
// 2 24 -1 1 1 -1 1 -1
  [2,24,-1,1,1,-1,1,-1],
// 2 24 -1 1 -1 1 1 -1
  [2,24,-1,1,-1,1,1,-1],
// 2 24 1 1 -1 1 1 1
  [2,24,1,1,-1,1,1,1],
// 2 24 1 0 1 -1 0 1
  [2,24,1,0,1,-1,0,1],
// 2 24 -1 0 1 -1 0 -1
  [2,24,-1,0,1,-1,0,-1],
// 2 24 -1 0 -1 1 0 -1
  [2,24,-1,0,-1,1,0,-1],
// 2 24 1 0 -1 1 0 1
  [2,24,1,0,-1,1,0,1],
// 2 24 1 0 1 1 1 1
  [2,24,1,0,1,1,1,1],
// 2 24 -1 0 1 -1 1 1
  [2,24,-1,0,1,-1,1,1],
// 2 24 1 0 -1 1 1 -1
  [2,24,1,0,-1,1,1,-1],
// 2 24 -1 0 -1 -1 1 -1
  [2,24,-1,0,-1,-1,1,-1],
// 4 16 1 1 1 1 1 -1 -1 1 -1 -1 1 1
  [4,16,1,1,1,1,1,-1,-1,1,-1,-1,1,1],
// 4 16 1 1 1 -1 1 1 -1 0 1 1 0 1
  [4,16,1,1,1,-1,1,1,-1,0,1,1,0,1],
// 4 16 -1 1 1 -1 1 -1 -1 0 -1 -1 0 1
  [4,16,-1,1,1,-1,1,-1,-1,0,-1,-1,0,1],
// 0 4 16 -1 1 -1 -1 0 -1 1 0 -1 1 1 -1
// 4 16 1 1 -1 1 1 1 1 0 1 1 0 -1
  [4,16,1,1,-1,1,1,1,1,0,1,1,0,-1],
// 0
];
module ldraw_lib__box4t(step=0, col=false, unit=2/5, alt=false, line=0.2, solid=!$preview)
    makepoly(ldraw_lib__box4t(solid), step=step, col=col, unit=unit, alt=alt, line=line, solid=solid);
ldraw_lib__box4t(line=0.2);
// file: 3004.scad
use <../lib.scad>
use <s/3004s01.scad>
$fa=1; $fs=0.2;
function ldraw_lib__3004(realsolid=false) = [
// 0 Brick  1 x  2
// 0 Name: 3004.dat
// 0 Author: James Jessiman
// 0 !LDRAW_ORG Part UPDATE 2022-05
// 0 !LICENSE Licensed under CC BY 2.0 and CC BY 4.0 : see CAreadme.txt
// 
// 0 BFC CERTIFY CCW
  [0,"BFC","CERTIFY"],
  [0,"BFC","CCW"],
// 
// 0 !HISTORY 2001-10-26 [PTadmin] Official Update 2001-01
// 0 !HISTORY 2002-05-07 {unknown} BFC Certification
// 0 !HISTORY 2002-06-11 [PTadmin] Official Update 2002-03
// 0 !HISTORY 2007-05-07 [PTadmin] Header formatted for Contributor Agreement
// 0 !HISTORY 2008-07-01 [PTadmin] Official Update 2008-01
// 0 !HISTORY 2022-08-04 [MagFors] Using subfile
// 0 !HISTORY 2022-09-15 [PTadmin] Official Update 2022-05
// 
// 
// 1 16 0 0 0 1 0 0 0 1 0 0 0 1 s\3004s01.dat
  [1,16,0,0,0,1,0,0,0,1,0,0,0,1, ldraw_lib__s__3004s01(realsolid)],
// 4 16 -20 24 -10 20 24 -10 20 0 -10 -20 0 -10
  [4,16,-20,24,-10,20,24,-10,20,0,-10,-20,0,-10],
];
module ldraw_lib__3004(step=0, col=false, unit=2/5, alt=false, line=0.2, solid=!$preview)
    makepoly(ldraw_lib__3004(solid), step=step, col=col, unit=unit, alt=alt, line=line, solid=solid);
ldraw_lib__3004(line=0.2);
// file: s/3024s01.scad
use <../../lib.scad>
use <../../p/box4t.scad>
use <../../p/box5.scad>
use <../../p/stud.scad>
$fa=1; $fs=0.2;
function ldraw_lib__s__3024s01(realsolid=false) = [
// 0 ~Plate  1 x  1 without Front Face
// 0 Name: s\3024s01.dat
// 0 Author: Tore Eriksson [Tore_Eriksson]
// 0 !LDRAW_ORG Subpart UPDATE 2012-03
// 0 !LICENSE Licensed under CC BY 2.0 and CC BY 4.0 : see CAreadme.txt
// 
// 0 BFC CERTIFY CCW
  [0,"BFC","CERTIFY"],
  [0,"BFC","CCW"],
// 
// 0 !HISTORY 2012-12-28 [PTadmin] Official Update 2012-03
// 
// 
// 0 BFC INVERTNEXT
  [0,"BFC","INVERTNEXT"],
// 1 16 0 8 0 0 0 6 0 -4 0 -6 0 0 box5.dat
  [1,16,0,8,0,0,0,6,0,-4,0,-6,0,0, ldraw_lib__box5(realsolid)],
// 4 16 10 8 -10 6 8 -6 6 8 6 10 8 10
  [4,16,10,8,-10,6,8,-6,6,8,6,10,8,10],
// 4 16 10 8 10 6 8 6 -6 8 6 -10 8 10
  [4,16,10,8,10,6,8,6,-6,8,6,-10,8,10],
// 4 16 -10 8 10 -6 8 6 -6 8 -6 -10 8 -10
  [4,16,-10,8,10,-6,8,6,-6,8,-6,-10,8,-10],
// 4 16 -10 8 -10 -6 8 -6 6 8 -6 10 8 -10
  [4,16,-10,8,-10,-6,8,-6,6,8,-6,10,8,-10],
// 1 16 0 8 0 10 0 0 0 -8 0 0 0 10 box4t.dat
  [1,16,0,8,0,10,0,0,0,-8,0,0,0,10, ldraw_lib__box4t(realsolid)],
// 1 16 0 0 0 0 0 1 0 1 0 -1 0 0 stud.dat
  [1,16,0,0,0,0,0,1,0,1,0,-1,0,0, ldraw_lib__stud(realsolid)],
];
module ldraw_lib__s__3024s01(step=0, col=false, unit=2/5, alt=false, line=0.2, solid=!$preview)
    makepoly(ldraw_lib__s__3024s01(solid), step=step, col=col, unit=unit, alt=alt, line=line, solid=solid);
ldraw_lib__s__3024s01(line=0.2);
// main file
use <../lib.scad>
use <s/3024s01.scad>
$fa=1; $fs=0.2;
function ldraw_lib__3024px1(realsolid=false) = [
// 0 Plate  1 x  1 with  2 Black Squares and Dark Pink Rectangle Pattern
// 0 Name: 3024px1.dat
// 0 Author: Vincent Messenet [Cheenzo]
// 0 !LDRAW_ORG Part UPDATE 2022-04
// 0 !LICENSE Licensed under CC BY 2.0 and CC BY 4.0 : see CAreadme.txt
// 
// 0 BFC CERTIFY CCW
  [0,"BFC","CERTIFY"],
  [0,"BFC","CCW"],
// 
// 0 !KEYWORDS Axolotl, BrickLink 3024pb018, Brickowl 1264861, Eyes, face
// 0 !KEYWORDS Minecraft, Nose, Rebrickable 3024pr0021, Set 21180
// 
// 0 !HISTORY 2022-07-18 [PTadmin] Official Update 2022-04
// 
// 
// 1 16 0 0 0 1 0 0 0 1 0 0 0 1 s\3024s01.dat
  [1,16,0,0,0,1,0,0,0,1,0,0,0,1, ldraw_lib__s__3024s01(realsolid)],
// 
// 4 0 -6.25 7.75 -10 -6.25 4.25 -10 -9.75 4.25 -10 -9.75 7.75 -10
  [4,0,-6.25,7.75,-10,-6.25,4.25,-10,-9.75,4.25,-10,-9.75,7.75,-10],
// 4 0 6.25 4.25 -10 6.25 7.75 -10 9.75 7.75 -10 9.75 4.25 -10
  [4,0,6.25,4.25,-10,6.25,7.75,-10,9.75,7.75,-10,9.75,4.25,-10],
// 
// 4 5 3.25 7.75 -10 3.25 4.25 -10 -3.25 4.25 -10 -3.25 7.75 -10
  [4,5,3.25,7.75,-10,3.25,4.25,-10,-3.25,4.25,-10,-3.25,7.75,-10],
// 4 16 -10 8 -10 -9.75 7.75 -10 -9.75 4.25 -10 -10 0 -10
  [4,16,-10,8,-10,-9.75,7.75,-10,-9.75,4.25,-10,-10,0,-10],
// 3 16 -10 0 -10 -9.75 4.25 -10 -6.25 4.25 -10
  [3,16,-10,0,-10,-9.75,4.25,-10,-6.25,4.25,-10],
// 3 16 -10 0 -10 -6.25 4.25 -10 -3.25 4.25 -10
  [3,16,-10,0,-10,-6.25,4.25,-10,-3.25,4.25,-10],
// 4 16 -10 0 -10 -3.25 4.25 -10 3.25 4.25 -10 10 0 -10
  [4,16,-10,0,-10,-3.25,4.25,-10,3.25,4.25,-10,10,0,-10],
// 3 16 3.25 4.25 -10 6.25 4.25 -10 10 0 -10
  [3,16,3.25,4.25,-10,6.25,4.25,-10,10,0,-10],
// 3 16 10 0 -10 6.25 4.25 -10 9.75 4.25 -10
  [3,16,10,0,-10,6.25,4.25,-10,9.75,4.25,-10],
// 4 16 10 0 -10 9.75 4.25 -10 9.75 7.75 -10 10 8 -10
  [4,16,10,0,-10,9.75,4.25,-10,9.75,7.75,-10,10,8,-10],
// 3 16 10 8 -10 9.75 7.75 -10 6.25 7.75 -10
  [3,16,10,8,-10,9.75,7.75,-10,6.25,7.75,-10],
// 3 16 10 8 -10 6.25 7.75 -10 3.25 7.75 -10
  [3,16,10,8,-10,6.25,7.75,-10,3.25,7.75,-10],
// 4 16 10 8 -10 3.25 7.75 -10 -3.25 7.75 -10 -10 8 -10
  [4,16,10,8,-10,3.25,7.75,-10,-3.25,7.75,-10,-10,8,-10],
// 3 16 -3.25 7.75 -10 -6.25 7.75 -10 -10 8 -10
  [3,16,-3.25,7.75,-10,-6.25,7.75,-10,-10,8,-10],
// 3 16 -10 8 -10 -6.25 7.75 -10 -9.75 7.75 -10
  [3,16,-10,8,-10,-6.25,7.75,-10,-9.75,7.75,-10],
// 4 16 -3.25 7.75 -10 -3.25 4.25 -10 -6.25 4.25 -10 -6.25 7.75 -10
  [4,16,-3.25,7.75,-10,-3.25,4.25,-10,-6.25,4.25,-10,-6.25,7.75,-10],
// 4 16 6.25 7.75 -10 6.25 4.25 -10 3.25 4.25 -10 3.25 7.75 -10
  [4,16,6.25,7.75,-10,6.25,4.25,-10,3.25,4.25,-10,3.25,7.75,-10],
];
module ldraw_lib__3024px1(step=0, col=false, unit=2/5, alt=false, line=0.2, solid=!$preview)
    makepoly(ldraw_lib__3024px1(solid), step=step, col=col, unit=unit, alt=alt, line=line, solid=solid);
ldraw_lib__3024px1(line=0.2);
